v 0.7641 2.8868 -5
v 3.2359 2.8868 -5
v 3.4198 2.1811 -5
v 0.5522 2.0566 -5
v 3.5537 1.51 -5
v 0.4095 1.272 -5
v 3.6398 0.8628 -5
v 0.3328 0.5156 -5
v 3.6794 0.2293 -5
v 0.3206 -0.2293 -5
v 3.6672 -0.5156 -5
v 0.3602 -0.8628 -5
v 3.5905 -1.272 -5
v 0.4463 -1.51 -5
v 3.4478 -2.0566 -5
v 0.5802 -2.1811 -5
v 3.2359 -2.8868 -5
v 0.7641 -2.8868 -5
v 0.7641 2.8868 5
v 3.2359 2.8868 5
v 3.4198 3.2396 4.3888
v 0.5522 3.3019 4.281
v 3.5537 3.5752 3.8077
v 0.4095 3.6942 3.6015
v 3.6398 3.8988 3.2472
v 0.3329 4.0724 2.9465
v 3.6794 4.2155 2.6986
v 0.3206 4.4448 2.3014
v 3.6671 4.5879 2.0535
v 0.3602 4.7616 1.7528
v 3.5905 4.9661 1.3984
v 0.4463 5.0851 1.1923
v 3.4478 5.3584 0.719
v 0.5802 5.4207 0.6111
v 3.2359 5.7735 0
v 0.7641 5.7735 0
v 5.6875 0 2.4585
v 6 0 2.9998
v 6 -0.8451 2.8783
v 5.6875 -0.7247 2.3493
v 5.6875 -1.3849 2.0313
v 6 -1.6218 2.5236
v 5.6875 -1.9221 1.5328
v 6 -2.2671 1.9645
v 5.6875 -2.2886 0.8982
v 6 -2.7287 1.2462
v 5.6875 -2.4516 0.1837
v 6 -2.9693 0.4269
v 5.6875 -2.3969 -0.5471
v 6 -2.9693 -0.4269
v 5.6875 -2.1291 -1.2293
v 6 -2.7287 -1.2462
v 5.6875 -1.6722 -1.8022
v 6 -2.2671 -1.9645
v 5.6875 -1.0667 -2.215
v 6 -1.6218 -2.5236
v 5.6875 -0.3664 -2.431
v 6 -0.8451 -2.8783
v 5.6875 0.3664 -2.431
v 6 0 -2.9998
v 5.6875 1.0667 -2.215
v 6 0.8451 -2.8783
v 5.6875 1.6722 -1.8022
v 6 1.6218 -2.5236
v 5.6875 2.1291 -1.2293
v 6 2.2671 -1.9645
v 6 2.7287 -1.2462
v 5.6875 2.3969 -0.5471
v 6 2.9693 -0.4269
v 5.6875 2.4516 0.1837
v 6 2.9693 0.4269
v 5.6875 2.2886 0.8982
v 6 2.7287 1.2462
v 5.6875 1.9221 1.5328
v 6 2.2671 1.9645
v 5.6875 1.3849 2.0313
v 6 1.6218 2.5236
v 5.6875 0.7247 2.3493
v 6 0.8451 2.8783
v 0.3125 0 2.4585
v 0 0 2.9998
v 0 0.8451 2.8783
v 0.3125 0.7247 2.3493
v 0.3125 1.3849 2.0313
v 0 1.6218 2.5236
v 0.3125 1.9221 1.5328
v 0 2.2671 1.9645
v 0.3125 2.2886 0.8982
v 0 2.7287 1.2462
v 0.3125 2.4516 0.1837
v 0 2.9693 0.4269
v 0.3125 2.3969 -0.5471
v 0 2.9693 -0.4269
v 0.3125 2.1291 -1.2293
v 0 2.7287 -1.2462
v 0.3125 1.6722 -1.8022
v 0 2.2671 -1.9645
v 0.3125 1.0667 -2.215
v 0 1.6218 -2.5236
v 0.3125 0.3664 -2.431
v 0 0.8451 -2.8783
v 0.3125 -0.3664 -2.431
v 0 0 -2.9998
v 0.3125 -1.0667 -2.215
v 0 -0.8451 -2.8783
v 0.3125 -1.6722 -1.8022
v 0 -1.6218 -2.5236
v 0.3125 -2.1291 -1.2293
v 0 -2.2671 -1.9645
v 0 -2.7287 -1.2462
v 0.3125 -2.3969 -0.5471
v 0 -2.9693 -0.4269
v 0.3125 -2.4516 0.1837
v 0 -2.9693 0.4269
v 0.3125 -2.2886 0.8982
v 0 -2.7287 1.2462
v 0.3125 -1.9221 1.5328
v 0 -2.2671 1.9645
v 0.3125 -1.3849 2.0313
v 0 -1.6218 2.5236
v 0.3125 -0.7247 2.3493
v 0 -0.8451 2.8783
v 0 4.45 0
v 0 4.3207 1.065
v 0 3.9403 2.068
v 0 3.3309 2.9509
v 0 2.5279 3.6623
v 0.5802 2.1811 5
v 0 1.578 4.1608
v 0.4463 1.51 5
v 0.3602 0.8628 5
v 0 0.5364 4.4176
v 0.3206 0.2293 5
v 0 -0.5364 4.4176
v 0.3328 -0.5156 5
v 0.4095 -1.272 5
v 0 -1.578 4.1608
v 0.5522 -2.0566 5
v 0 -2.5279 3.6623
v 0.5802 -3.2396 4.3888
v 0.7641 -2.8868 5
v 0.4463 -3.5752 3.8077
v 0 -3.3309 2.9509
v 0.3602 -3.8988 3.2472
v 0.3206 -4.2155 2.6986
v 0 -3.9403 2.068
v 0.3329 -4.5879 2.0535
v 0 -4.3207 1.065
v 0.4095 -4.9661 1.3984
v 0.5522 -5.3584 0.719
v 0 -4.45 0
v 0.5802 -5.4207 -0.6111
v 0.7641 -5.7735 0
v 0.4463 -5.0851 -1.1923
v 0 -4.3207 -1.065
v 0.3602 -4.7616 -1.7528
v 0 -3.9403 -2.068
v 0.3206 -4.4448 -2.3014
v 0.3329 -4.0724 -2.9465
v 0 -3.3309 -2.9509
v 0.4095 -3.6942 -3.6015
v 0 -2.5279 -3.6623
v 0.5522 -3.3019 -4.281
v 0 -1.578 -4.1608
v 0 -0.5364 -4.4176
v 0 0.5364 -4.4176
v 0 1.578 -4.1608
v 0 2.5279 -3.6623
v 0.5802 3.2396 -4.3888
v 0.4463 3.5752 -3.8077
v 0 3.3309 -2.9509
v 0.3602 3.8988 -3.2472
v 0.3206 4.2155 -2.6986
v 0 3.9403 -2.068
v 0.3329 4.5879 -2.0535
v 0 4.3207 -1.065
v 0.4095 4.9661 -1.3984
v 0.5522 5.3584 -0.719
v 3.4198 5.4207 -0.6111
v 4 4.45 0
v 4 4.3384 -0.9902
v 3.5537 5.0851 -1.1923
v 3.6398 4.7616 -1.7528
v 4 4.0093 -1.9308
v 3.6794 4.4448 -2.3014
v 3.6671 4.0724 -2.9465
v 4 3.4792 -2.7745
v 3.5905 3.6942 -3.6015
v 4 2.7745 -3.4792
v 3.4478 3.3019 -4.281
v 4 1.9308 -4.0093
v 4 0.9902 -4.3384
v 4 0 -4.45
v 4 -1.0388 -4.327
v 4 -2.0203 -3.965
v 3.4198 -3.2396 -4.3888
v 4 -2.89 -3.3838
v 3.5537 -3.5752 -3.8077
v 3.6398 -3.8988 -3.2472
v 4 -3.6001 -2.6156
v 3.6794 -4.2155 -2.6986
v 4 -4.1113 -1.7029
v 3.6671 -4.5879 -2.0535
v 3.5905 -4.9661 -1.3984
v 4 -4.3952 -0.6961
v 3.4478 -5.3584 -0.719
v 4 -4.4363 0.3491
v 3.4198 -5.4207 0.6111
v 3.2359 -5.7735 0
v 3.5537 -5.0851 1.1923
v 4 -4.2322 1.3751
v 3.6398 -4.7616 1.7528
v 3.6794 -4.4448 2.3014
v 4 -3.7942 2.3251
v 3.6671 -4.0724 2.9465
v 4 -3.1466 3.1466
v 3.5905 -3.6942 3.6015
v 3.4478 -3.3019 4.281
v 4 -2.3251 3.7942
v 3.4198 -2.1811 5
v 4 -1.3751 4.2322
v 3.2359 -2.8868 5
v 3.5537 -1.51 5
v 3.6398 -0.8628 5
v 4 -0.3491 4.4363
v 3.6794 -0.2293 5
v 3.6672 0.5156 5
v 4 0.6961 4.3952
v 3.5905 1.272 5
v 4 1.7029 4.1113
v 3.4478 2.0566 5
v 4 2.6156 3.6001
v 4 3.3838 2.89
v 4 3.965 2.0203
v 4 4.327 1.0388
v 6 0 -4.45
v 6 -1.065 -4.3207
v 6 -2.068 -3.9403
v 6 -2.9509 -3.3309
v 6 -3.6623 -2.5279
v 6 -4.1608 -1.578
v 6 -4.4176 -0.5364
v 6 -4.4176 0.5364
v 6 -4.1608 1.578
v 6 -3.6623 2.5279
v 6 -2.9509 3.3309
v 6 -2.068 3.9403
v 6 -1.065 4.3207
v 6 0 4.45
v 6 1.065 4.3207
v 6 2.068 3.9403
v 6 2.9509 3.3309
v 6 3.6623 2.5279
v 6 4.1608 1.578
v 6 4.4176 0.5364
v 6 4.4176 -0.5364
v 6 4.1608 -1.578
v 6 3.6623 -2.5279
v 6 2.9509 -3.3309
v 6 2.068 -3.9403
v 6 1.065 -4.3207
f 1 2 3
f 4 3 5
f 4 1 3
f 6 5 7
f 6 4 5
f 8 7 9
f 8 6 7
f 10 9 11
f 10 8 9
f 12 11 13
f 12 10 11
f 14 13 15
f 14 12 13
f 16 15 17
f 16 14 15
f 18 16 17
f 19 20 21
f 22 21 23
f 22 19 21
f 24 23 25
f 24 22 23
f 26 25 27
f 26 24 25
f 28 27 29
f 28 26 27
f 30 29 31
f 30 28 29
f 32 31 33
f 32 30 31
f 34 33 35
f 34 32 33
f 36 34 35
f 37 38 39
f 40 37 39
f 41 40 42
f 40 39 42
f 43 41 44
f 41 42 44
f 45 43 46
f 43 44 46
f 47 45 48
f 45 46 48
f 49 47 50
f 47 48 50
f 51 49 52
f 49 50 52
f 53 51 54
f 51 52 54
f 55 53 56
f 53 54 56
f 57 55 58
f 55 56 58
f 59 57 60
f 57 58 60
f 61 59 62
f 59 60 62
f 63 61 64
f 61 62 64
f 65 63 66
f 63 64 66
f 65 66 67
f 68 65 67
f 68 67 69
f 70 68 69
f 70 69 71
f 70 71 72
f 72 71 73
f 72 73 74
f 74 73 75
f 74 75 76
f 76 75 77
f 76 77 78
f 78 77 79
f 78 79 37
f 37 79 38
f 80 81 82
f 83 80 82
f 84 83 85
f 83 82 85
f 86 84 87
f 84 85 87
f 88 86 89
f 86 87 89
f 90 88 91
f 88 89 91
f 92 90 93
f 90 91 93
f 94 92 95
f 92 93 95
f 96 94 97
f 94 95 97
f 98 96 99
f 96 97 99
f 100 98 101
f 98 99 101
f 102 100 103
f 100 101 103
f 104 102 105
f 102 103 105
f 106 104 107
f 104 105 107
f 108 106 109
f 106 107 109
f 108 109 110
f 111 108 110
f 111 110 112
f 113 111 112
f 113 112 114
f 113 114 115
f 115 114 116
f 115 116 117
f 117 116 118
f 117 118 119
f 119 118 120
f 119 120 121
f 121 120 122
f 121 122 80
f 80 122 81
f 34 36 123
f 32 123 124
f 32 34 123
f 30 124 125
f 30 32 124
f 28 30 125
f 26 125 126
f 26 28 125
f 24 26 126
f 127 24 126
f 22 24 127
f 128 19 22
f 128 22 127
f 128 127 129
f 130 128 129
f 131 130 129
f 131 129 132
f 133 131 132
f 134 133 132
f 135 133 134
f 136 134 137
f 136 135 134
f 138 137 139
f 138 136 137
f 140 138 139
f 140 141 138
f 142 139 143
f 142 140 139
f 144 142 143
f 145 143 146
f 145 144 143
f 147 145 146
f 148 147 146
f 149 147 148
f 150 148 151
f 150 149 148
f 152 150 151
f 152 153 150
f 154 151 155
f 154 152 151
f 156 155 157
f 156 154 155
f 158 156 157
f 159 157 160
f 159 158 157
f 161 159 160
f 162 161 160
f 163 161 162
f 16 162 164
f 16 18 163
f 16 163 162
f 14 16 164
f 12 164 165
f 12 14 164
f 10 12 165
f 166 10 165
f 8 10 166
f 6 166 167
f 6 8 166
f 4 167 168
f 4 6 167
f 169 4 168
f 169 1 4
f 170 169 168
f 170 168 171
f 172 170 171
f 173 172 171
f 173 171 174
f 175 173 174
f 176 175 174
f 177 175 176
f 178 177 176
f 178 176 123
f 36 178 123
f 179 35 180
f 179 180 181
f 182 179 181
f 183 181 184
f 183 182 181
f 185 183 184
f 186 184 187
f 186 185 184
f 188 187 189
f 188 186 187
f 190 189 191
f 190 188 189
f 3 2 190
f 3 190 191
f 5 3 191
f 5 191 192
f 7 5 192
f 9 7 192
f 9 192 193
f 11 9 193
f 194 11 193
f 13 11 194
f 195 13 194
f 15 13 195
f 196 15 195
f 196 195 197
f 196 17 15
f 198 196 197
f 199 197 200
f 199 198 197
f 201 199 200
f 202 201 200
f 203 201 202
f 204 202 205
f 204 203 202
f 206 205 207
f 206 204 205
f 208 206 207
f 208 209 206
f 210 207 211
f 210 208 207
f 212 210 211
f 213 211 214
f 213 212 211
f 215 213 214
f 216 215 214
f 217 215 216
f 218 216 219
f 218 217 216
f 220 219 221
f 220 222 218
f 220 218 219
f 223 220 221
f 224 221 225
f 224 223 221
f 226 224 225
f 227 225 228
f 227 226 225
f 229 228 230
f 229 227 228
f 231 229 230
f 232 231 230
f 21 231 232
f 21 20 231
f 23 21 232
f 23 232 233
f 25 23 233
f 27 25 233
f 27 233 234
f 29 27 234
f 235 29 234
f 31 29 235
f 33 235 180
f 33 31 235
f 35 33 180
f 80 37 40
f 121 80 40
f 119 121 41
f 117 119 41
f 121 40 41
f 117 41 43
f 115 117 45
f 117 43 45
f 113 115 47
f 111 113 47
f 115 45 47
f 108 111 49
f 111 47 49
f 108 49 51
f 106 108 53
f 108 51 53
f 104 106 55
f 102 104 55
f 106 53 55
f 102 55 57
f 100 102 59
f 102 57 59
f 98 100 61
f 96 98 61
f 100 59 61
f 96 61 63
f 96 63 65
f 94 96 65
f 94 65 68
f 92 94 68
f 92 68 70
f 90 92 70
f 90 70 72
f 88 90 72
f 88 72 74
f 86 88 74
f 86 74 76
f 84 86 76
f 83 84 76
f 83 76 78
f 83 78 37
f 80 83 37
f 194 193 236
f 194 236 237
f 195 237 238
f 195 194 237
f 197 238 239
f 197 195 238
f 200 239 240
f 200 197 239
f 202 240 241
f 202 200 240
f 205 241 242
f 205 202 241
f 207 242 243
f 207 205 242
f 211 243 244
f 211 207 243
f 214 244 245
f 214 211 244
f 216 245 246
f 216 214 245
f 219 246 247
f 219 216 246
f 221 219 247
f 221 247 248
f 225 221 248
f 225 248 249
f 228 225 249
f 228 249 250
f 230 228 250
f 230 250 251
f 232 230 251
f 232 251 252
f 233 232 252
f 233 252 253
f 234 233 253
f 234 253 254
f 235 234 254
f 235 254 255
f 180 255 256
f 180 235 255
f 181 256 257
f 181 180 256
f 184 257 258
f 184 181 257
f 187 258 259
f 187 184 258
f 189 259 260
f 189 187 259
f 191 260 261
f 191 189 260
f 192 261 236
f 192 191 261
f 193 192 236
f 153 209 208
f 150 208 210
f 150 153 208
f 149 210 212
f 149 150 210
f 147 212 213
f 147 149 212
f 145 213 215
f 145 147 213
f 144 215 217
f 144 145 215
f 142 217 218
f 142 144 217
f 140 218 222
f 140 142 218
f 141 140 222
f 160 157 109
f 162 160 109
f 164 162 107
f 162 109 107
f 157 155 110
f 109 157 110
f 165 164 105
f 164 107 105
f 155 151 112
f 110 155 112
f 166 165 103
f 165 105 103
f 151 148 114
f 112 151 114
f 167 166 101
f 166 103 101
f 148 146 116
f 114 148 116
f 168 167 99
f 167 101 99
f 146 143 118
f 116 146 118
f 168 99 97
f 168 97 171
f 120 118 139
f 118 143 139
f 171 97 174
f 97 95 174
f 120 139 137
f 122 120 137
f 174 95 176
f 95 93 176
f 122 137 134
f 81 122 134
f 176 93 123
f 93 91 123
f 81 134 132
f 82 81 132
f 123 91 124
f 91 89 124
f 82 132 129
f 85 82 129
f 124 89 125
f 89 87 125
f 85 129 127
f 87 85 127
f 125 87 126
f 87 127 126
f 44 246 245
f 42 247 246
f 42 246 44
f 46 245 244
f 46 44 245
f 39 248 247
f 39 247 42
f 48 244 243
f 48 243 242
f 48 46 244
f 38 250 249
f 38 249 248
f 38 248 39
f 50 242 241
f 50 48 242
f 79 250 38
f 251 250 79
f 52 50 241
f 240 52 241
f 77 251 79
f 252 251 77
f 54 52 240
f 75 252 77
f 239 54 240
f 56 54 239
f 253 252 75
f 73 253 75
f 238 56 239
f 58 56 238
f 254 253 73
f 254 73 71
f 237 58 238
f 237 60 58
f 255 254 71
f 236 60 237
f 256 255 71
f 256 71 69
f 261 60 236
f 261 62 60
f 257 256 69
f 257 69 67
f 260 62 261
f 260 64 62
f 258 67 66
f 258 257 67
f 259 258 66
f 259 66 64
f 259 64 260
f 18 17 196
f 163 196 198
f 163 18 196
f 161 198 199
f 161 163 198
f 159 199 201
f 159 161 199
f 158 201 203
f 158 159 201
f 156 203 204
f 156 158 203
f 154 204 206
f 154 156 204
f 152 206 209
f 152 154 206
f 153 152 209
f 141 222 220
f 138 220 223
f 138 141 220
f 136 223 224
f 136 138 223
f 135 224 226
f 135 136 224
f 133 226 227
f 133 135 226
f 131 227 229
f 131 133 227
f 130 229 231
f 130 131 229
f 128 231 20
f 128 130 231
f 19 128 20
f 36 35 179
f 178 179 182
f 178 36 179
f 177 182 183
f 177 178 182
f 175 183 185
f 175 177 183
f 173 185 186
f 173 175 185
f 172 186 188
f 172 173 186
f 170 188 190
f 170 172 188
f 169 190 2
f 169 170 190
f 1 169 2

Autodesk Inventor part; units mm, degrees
ref_plane "YZ Plane" through (0, 0, 0) normal (1, 0, 0) x (0, 1, 0)
ref_plane "XZ Plane" through (0, 0, 0) normal (0, 1, 0) x (-1, 0, 0)
sketch "Skizze1" plane through (0, 0, 0) normal (1, 0, 0) x (0, 1, 0)
  line L0 (2.8868, -5) -> (-2.8868, -5)
  line L1 (-2.8868, -5) -> (-5.7735, 0)
  line L2 (-5.7735, 0) -> (-2.8868, 5)
  line L3 (-2.8868, 5) -> (2.8868, 5)
  line L4 (2.8868, 5) -> (5.7735, 0)
  line L5 (5.7735, 0) -> (2.8868, -5)
  point P0 (0, 0)
  point P1 (0, 0)
  dimension "d0" = 11.547
extrude "Körper" add sketch "Skizze1" along normal blind 4
sketch "Skizze2" plane through (4, 0, 0) normal (1, 0, 0) x (0, 0, -1)
  circle A0 centre (0, 0) radius 4.45
  dimension "d7" = 8.9
extrude "Ring" add sketch "Skizze2" along normal blind 2
sketch "Skizze3" plane through (0, 0, 0) normal (0, 0, 1) x (1, 0, 0)
  line L0 (0, 2.8868) -> (0, 5.7735) projected
  line L1 (0, 5.7735) -> (4, 5.7735) projected
  line L2 (4, 2.8868) -> (4, 5.7735) projected
  line L3 (-0.8, 0) -> (4.8, 0) projected
  line L4 (0, 4.45) -> (0.7641, 5.7735)
  line L5 (3.2359, 5.7735) -> (4, 4.45)
  dimension "d3" = 30
  dimension "d4" = 30
  dimension "d5" = 8.9
  dimension "d6" = 8.9
revolve "Fase1" cut sketch "Skizze3" angle 360 about axis through (-10, 0, 0) along (1, 0, 0)
sketch "Skizze4" plane through (0, 0, 0) normal (-1, 0, 0) x (0, 0, 1)
  line L0 (0, -8.0829) -> (0, 8.0829) projected
  line L1 (-7, 0) -> (7, 0) projected
  point P0 (0, 0)
hole "Gewinde" at (0, 0, 0) direction (1, 0, 0) diameter 4.917 end through all thread size "M6x1" class "6H" standard "ISO Metric profile"
chamfer "Fase2" distance 0.5413 angle 30 1 edges at (0, 0, -2.4585) measured on face at (0, 3.7371, -0.4538)
chamfer "Fase3" distance 0.5413 angle 30 1 edges at (6, 0, -2.4585) measured on face at (6, -0.5511, -3.7193)
ref_plane "Work Plane1" through (16.4368, 0, 0) normal (0, 0, 1) x (-1, 0, 0)
equation "\"d0\" = 1.1547 * SW"
equation "\"d1\" = KOH1"
equation "\"d7\" = SD2"
equation "\"d8\" = KOH - KOH1"
equation "\"d3\" = ANG1"
equation "\"d4\" = ANG2"
equation "\"d5\" = SW0"
equation "\"d6\" = SW01"
equation "\"d10\" = -0.5 * GD1 + 0.5 * NND"
equation "\"d46\" = -0.5 * GD1 + 0.5 * NND"
equation "\"d12\" = -0.5 * GD1 + 0.5 * NND"
equation "\"d47\" = -0.5 * GD1 + 0.5 * NND"
equation "\"ANG1\" = 30deg"
equation "\"ANG2\" = 30deg"
equation "\"NND\" = 6"
equation "\"KOH1\" = 4"
equation "\"KOH\" = 6"
equation "\"SW0\" = 8.9"
equation "\"SW01\" = SW0"
equation "\"SD2\" = SW0"
equation "\"GUL\" = 0.541266 * PTC"
equation "\"THREADDIA\" = 6"
equation "\"TOA\" = 30deg"
equation "\"PTC\" = 1"
equation "\"GAL\" = 0.541266 * PTC"
equation "\"E0\" = 1.155 * SW"
equation "\"SW\" = 10"
equation "\"GD1\" = 4.917468"
properties part number "DIN 985 - M6" material "Stahl, weich"
